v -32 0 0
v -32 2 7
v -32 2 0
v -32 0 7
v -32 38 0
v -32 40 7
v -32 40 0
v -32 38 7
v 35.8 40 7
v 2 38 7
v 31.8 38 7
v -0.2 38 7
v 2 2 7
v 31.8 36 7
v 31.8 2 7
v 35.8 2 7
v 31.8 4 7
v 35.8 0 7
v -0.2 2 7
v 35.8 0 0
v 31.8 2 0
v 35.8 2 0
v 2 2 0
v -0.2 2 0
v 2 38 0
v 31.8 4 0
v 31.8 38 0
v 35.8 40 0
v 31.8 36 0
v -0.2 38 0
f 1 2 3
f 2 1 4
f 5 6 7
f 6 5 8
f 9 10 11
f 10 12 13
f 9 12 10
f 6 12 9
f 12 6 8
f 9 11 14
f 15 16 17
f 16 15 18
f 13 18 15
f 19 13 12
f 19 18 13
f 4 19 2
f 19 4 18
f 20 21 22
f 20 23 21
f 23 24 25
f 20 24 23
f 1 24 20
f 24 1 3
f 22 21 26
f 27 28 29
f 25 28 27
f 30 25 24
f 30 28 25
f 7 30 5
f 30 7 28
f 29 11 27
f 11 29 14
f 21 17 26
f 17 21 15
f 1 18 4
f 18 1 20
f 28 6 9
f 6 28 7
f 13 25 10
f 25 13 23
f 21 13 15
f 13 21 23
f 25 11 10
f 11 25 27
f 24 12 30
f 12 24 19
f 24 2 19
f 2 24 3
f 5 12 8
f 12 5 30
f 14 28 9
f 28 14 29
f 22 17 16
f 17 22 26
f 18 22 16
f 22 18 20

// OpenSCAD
// : mm of extra z clearance you wish to add. usually around your glass thickness. note: 1/8" = 3.175mm, 3/8" = 9.525mm, 5/8" = 15.625mm, 3/4" = 19.05mm
ADJUST_HEIGHT = 2; // [0.8, 1, 1.5, 2, 2.5, 3, 3.175, 3.5, 4, 4.5, 5, 5.6, 6, 9.525, 15.625, 19.05]
// : a 1/10 mm fine tuning of the adjust_height. For example choosing 1.5 above and -0.2 here results in height = 1.5-0.2 = 1.3mm.
FINE_TUNE_HEIGHT = 0.0; // [-0.5, -0.4, -0.3, -0.2, -0.1, 0.0, 0.1, 0.2, 0.3, 0.4, 0.5]
// : how wide you want the spacer to be. 7mm is just right for fully covering the exposed side.
SPACER_WIDTH = 7; // [5,6,7]
// : how much you would like the tines of the hook to stick out. 
HOOK_PROTUBERANCE = 2.0; // [2.0, 3.0, 4.0]
// : add insertion levers on the back allowing you to insert and remove from the machine without disassembly. 1=Levers 0=No Levers
INSERTION_LEVERS = 1; // [0,1]

module zadjust() {

    HOOK_LENGTH = HOOK_PROTUBERANCE;
    ID_HEIGHT = 36;
    ID_WIDTH = 29.8;
    BASE_WIDTH = 2;
    LEVER_LENGTH = 32;
    EXTRA_HEIGHT = ADJUST_HEIGHT+FINE_TUNE_HEIGHT;
    
    translate([ID_WIDTH+HOOK_LENGTH, ID_HEIGHT+BASE_WIDTH+EXTRA_HEIGHT])
rotate([0,0,180]){
    // C shape
    difference() {
        // positive
        xsize = INSERTION_LEVERS ? ID_WIDTH+BASE_WIDTH+LEVER_LENGTH : ID_WIDTH+BASE_WIDTH;
        scale([xsize, ID_HEIGHT+BASE_WIDTH+EXTRA_HEIGHT, SPACER_WIDTH])
            cube();
        
        // negative
        translate([-0.01, BASE_WIDTH, -0.01])
            scale([ID_WIDTH+0.01,ID_HEIGHT,SPACER_WIDTH+0.02])
                cube();
        
        // insertion levers
        if(INSERTION_LEVERS)
            translate([LEVER_LENGTH, BASE_WIDTH, -0.01])
                scale([LEVER_LENGTH+BASE_WIDTH+0.01,ID_HEIGHT,SPACER_WIDTH+0.02])
                    cube();
    }
    
    // top hook
    translate([-BASE_WIDTH*HOOK_LENGTH,0,0])
        scale([BASE_WIDTH*HOOK_LENGTH, BASE_WIDTH+HOOK_PROTUBERANCE, SPACER_WIDTH])
            linear_extrude(1)
                polygon(points=[[1,1],[1,0],[0,0]]);
    
    // bottom hook
    translate([-BASE_WIDTH*HOOK_LENGTH,ID_HEIGHT+BASE_WIDTH+EXTRA_HEIGHT-(HOOK_PROTUBERANCE+EXTRA_HEIGHT),0])
        scale([BASE_WIDTH*HOOK_LENGTH, HOOK_PROTUBERANCE, SPACER_WIDTH])
            linear_extrude(1)
                translate([0,1,0])
                rotate([180,0,0])
                polygon(points=[[1,1],[1,0],[0,0]]);
    
    // bottom fill
    translate([-BASE_WIDTH*HOOK_LENGTH,ID_HEIGHT+BASE_WIDTH,0])
    scale([BASE_WIDTH*HOOK_LENGTH,EXTRA_HEIGHT,SPACER_WIDTH])
    cube();
}
}
color([0.4,0.7,0.8])
zadjust();
